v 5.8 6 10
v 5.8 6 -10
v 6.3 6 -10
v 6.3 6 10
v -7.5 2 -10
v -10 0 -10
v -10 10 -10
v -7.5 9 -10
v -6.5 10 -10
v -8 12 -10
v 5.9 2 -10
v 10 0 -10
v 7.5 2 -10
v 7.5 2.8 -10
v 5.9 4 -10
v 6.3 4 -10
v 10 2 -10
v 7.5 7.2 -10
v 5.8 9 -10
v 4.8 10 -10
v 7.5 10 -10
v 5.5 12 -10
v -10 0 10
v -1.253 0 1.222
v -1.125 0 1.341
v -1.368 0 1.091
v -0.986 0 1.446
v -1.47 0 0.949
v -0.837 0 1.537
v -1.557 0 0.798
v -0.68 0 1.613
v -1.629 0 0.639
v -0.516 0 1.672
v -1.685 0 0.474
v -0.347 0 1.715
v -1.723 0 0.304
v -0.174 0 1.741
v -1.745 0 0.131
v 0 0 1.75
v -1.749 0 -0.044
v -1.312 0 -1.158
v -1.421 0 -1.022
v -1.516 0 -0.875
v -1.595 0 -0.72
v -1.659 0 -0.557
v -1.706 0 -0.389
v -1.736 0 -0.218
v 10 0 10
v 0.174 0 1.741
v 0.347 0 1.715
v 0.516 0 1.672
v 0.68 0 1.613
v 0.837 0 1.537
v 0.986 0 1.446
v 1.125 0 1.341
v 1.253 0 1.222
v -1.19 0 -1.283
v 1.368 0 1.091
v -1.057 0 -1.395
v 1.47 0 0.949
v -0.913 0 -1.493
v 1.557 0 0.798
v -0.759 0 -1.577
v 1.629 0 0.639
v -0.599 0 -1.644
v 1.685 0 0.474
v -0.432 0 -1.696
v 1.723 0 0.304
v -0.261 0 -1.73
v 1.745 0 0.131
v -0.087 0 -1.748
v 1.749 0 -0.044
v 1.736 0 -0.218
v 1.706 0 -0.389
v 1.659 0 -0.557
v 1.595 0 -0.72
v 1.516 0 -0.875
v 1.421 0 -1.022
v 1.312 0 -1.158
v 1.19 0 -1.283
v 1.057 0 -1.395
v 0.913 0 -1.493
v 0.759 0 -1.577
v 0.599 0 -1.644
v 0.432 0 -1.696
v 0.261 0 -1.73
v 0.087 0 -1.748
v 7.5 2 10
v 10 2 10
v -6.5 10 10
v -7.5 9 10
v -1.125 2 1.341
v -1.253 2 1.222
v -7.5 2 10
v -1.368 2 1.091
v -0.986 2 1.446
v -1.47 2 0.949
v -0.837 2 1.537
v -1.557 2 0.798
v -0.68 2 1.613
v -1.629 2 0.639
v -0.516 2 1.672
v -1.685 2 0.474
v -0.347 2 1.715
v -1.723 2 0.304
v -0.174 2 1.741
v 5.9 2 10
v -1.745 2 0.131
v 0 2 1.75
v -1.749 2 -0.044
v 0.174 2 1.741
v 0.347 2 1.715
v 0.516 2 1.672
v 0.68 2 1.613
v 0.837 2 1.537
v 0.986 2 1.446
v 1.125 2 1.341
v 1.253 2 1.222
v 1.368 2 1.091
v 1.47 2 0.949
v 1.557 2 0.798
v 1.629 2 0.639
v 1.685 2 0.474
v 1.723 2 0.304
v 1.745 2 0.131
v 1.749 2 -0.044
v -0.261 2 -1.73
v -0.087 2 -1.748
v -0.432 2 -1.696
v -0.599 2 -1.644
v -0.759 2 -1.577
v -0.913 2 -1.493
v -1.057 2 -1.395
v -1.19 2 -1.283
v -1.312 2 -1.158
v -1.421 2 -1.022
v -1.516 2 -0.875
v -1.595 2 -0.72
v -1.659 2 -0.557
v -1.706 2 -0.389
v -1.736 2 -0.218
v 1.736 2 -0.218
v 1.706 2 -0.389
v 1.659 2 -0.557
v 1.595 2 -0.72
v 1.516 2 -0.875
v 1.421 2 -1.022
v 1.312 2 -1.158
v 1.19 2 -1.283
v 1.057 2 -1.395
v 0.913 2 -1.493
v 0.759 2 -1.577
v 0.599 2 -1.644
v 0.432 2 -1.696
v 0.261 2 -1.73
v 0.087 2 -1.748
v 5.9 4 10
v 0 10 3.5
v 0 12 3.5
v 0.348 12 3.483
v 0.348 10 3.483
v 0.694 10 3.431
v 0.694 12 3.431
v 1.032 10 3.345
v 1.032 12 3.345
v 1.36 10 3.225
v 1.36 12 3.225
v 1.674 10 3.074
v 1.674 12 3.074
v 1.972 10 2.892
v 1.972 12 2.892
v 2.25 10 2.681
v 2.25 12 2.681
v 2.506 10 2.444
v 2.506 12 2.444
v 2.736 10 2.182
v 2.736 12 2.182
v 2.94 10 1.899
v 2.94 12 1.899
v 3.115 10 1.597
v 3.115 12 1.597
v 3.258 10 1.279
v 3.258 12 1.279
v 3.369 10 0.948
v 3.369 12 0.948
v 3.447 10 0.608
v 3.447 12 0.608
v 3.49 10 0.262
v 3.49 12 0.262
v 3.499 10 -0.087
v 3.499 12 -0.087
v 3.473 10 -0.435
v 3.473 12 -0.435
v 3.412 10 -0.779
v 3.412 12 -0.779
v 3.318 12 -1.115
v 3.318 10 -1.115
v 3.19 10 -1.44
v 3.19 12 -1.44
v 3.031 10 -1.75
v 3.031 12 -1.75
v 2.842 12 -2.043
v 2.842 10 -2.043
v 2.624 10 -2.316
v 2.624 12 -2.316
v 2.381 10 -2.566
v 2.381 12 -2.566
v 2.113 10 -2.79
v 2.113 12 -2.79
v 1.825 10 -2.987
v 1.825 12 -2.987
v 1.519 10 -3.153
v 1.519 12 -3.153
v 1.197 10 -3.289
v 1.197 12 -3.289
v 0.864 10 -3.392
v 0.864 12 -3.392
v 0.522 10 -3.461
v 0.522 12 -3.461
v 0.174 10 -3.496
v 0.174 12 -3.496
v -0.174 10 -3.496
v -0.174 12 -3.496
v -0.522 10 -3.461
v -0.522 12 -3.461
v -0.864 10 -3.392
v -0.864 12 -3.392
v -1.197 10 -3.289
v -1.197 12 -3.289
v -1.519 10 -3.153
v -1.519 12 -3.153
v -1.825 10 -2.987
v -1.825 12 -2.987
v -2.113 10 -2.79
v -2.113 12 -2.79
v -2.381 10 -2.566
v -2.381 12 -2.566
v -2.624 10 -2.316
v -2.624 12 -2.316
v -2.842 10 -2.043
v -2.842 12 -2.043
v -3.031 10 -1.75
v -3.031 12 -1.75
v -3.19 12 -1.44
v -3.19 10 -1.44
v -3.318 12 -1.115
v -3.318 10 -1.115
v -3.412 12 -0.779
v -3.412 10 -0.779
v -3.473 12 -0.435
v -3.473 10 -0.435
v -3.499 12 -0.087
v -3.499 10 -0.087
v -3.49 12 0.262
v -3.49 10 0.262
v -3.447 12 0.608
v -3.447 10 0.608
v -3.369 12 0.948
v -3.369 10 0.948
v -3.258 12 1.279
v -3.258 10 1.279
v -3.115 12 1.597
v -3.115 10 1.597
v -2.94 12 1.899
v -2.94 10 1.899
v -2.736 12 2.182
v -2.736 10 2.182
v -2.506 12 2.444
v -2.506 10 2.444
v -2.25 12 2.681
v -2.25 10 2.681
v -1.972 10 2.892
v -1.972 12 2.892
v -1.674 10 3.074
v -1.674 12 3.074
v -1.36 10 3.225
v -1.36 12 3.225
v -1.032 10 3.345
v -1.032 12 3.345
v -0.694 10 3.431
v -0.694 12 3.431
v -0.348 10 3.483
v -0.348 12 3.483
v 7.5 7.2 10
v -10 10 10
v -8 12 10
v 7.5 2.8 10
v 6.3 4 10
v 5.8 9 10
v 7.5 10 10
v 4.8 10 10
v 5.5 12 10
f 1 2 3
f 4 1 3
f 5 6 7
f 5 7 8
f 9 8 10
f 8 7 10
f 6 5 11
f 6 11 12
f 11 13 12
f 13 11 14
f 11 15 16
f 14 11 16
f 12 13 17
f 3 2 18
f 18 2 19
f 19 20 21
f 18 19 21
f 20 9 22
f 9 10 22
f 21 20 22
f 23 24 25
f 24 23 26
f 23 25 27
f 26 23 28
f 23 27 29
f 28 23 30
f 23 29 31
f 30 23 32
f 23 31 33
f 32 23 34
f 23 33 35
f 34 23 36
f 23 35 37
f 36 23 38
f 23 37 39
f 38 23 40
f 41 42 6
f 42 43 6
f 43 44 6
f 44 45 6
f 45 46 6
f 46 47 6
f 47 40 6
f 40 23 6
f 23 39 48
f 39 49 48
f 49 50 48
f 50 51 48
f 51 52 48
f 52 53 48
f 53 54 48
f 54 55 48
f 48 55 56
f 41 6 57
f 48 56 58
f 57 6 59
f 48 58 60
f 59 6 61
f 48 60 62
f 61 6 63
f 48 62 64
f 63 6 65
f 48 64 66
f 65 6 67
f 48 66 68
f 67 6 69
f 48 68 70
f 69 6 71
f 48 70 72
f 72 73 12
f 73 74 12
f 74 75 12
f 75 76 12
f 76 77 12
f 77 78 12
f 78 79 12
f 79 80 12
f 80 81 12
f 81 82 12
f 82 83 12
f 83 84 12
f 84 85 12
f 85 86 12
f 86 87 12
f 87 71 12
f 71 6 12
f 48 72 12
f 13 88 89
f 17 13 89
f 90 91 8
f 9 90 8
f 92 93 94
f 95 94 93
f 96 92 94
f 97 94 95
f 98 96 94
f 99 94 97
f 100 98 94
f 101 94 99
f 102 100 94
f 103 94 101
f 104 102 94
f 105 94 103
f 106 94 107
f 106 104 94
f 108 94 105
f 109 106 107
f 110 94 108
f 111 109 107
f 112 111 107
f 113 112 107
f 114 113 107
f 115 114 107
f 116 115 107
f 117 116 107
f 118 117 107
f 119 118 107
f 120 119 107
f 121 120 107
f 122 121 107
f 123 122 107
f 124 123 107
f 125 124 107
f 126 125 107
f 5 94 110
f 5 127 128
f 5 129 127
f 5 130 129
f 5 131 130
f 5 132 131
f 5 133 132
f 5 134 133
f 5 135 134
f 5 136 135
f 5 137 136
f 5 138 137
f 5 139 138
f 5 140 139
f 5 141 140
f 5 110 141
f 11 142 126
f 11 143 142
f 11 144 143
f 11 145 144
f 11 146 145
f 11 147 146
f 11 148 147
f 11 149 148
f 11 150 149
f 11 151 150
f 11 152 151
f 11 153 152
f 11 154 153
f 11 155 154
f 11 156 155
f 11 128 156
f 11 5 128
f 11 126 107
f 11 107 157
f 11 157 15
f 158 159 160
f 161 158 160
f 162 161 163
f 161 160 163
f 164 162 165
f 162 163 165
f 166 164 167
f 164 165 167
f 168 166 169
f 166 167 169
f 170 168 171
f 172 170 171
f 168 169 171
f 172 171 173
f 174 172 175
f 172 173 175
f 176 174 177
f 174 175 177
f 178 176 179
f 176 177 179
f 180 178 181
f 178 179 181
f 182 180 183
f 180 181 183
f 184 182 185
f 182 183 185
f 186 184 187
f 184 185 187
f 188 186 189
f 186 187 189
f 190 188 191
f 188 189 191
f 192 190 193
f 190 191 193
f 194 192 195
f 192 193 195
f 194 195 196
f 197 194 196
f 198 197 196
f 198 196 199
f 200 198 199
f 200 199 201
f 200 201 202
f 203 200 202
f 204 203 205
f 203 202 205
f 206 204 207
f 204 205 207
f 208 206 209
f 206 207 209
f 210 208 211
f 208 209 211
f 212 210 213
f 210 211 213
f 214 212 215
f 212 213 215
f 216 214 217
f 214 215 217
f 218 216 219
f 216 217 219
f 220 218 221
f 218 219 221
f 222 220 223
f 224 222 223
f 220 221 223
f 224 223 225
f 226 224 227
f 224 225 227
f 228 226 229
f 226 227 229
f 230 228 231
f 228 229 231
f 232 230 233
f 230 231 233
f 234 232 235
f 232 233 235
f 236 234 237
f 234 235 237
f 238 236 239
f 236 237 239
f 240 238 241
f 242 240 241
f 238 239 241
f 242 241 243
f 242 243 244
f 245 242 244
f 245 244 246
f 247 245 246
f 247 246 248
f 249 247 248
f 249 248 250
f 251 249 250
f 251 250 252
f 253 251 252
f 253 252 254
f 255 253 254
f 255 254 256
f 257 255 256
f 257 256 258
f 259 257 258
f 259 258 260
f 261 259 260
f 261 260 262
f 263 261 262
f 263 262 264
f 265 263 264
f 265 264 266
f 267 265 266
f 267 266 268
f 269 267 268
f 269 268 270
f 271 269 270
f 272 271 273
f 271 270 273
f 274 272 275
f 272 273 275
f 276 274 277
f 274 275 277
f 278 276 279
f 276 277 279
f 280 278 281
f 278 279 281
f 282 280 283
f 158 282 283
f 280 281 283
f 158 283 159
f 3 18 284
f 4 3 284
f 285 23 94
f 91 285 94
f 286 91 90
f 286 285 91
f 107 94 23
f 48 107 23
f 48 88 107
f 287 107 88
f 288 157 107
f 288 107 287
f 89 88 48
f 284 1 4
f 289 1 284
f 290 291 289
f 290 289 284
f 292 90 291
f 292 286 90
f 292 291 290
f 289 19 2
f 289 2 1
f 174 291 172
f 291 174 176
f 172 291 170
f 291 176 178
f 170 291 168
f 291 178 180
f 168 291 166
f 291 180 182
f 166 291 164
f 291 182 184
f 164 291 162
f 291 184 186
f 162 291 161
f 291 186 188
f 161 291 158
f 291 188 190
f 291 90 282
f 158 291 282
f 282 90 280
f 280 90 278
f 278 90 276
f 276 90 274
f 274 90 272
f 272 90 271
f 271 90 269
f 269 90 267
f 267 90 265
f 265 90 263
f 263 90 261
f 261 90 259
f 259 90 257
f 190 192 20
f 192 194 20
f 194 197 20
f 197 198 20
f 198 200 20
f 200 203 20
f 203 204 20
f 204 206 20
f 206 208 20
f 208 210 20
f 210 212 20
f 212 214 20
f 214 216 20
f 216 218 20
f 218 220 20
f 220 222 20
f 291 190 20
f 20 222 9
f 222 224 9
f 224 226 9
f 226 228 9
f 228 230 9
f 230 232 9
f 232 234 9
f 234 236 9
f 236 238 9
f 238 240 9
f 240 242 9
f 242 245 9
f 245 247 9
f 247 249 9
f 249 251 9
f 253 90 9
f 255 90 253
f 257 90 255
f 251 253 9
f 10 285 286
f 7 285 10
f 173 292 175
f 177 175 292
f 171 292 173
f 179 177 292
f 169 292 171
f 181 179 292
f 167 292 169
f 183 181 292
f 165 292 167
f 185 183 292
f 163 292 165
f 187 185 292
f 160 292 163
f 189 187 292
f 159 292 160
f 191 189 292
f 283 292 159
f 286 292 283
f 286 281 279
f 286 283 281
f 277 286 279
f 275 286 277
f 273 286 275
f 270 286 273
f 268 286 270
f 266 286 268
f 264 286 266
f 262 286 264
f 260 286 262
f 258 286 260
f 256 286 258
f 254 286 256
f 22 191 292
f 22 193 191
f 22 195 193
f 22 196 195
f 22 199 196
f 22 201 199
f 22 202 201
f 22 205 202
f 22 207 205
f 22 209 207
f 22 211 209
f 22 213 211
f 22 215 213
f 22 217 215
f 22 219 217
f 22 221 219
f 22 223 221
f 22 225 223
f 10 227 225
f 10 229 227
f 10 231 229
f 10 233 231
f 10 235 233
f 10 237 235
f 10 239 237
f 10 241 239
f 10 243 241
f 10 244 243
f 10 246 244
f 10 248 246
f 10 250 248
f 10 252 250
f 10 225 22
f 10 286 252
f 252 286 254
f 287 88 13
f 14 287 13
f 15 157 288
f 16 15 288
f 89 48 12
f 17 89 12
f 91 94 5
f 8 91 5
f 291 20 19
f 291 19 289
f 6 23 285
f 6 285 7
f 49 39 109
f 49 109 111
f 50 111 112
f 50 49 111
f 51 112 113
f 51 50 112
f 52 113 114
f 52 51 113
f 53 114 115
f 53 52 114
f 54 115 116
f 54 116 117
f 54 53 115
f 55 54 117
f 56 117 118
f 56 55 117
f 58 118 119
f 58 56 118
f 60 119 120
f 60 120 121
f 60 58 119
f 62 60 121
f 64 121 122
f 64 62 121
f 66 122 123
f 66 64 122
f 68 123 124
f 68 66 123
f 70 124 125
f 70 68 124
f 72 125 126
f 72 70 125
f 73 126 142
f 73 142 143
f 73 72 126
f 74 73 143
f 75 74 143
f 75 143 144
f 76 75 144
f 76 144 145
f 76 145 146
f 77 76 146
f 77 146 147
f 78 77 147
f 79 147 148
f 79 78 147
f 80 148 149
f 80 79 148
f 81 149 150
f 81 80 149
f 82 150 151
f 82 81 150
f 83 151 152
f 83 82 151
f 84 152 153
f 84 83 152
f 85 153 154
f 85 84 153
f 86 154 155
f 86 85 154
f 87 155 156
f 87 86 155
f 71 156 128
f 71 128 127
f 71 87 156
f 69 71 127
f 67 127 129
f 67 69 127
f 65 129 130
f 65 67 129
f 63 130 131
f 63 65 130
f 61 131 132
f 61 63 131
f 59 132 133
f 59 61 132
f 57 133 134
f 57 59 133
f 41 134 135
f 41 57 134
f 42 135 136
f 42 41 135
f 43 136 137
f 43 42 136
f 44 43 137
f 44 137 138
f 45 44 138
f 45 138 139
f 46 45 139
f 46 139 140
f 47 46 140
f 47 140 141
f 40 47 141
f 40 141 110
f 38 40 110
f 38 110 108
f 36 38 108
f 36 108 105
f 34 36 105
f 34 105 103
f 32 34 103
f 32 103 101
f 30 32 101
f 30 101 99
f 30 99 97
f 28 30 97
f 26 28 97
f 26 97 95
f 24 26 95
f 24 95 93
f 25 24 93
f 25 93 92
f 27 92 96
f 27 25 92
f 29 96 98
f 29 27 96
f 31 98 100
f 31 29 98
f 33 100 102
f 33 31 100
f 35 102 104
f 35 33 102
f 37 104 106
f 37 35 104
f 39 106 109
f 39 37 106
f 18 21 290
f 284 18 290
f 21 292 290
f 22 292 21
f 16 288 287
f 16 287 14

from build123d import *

# Parameters (mm, degrees)
SKETCH1_W           = 20
SKETCH1_H           = 20
SKETCH1_R           = 1.75
BOSS_EXTRUDE1_DEPTH = 2
SKETCH2_W           = 2.5
SKETCH2_H           = 20
BOSS_EXTRUDE2_DEPTH = 10
SKETCH3_W           = 20
SKETCH3_H           = 2
BOSS_EXTRUDE3_DEPTH = 15
SKETCH4_W           = 1.7
SKETCH4_H           = 20
BOSS_EXTRUDE4_DEPTH = 4
CHAMFER1_SIZE       = 1.2
CHAMFER2_SIZE       = 2
CHAMFER3_SIZE       = 1
SKETCH5_R           = 1.75
CUT_EXTRUDE1_DEPTH  = 34
SKETCH6_R           = 3.5
CUT_EXTRUDE2_DEPTH  = 2
SKETCH7_W           = 1.6
SKETCH7_H           = 20
BOSS_EXTRUDE5_DEPTH = 2
CHAMFER4_SIZE       = 1.2


with BuildPart() as part:
    # Sketch1 → Boss-Extrude1 (new body)
    with BuildSketch(Plane(origin=(0, 0, 0), x_dir=(1, 0, 0), z_dir=(0, 1, 0))):
        Rectangle(SKETCH1_W, SKETCH1_H)
        with Locations(Location((0, 0, 0), (0, 0, 270))):
            Circle(SKETCH1_R, mode=Mode.SUBTRACT)
    extrude(amount=BOSS_EXTRUDE1_DEPTH)

    # Sketch2 → Boss-Extrude2 (add)
    with BuildSketch(Plane(origin=(0, 2, 0), x_dir=(1, 0, 0), z_dir=(0, 1, 0))):
        with Locations((-8.75, 0)):
            Rectangle(SKETCH2_W, SKETCH2_H)
    extrude(amount=BOSS_EXTRUDE2_DEPTH)

    # Sketch3 → Boss-Extrude3 (add)
    with BuildSketch(Plane(origin=(-7.5, 0, 0), x_dir=(0, 0, -1), z_dir=(1, 0, 0))):
        with Locations((0, 11)):
            Rectangle(SKETCH3_W, SKETCH3_H)
    extrude(amount=BOSS_EXTRUDE3_DEPTH)

    # Sketch4 → Boss-Extrude4 (add)
    with BuildSketch(Plane.XZ.offset(-10)):
        with Locations((6.65, 0)):
            Rectangle(SKETCH4_W, SKETCH4_H)
    extrude(amount=BOSS_EXTRUDE4_DEPTH)

    # Chamfer1
    chamfer1_edges = [part.edges().sort_by_distance(p)[0] for p in [
        (7.5, 6, 0),
    ]]
    chamfer(chamfer1_edges, length=CHAMFER1_SIZE)

    # Chamfer2
    chamfer2_edges = [part.edges().sort_by_distance(p)[0] for p in [
        (-10, 12, 0),
        (7.5, 12, 0),
    ]]
    chamfer(chamfer2_edges, length=CHAMFER2_SIZE)

    # Chamfer3
    chamfer3_edges = [part.edges().sort_by_distance(p)[0] for p in [
        (-7.5, 10, 0),
        (5.8, 10, 0),
    ]]
    chamfer(chamfer3_edges, length=CHAMFER3_SIZE)

    # Sketch5 → Cut-Extrude1 (cut)
    with BuildSketch(Plane.XZ):
        with Locations(Location((0, 0, 0), (0, 0, 90))):
            Circle(SKETCH5_R)
    extrude(amount=-CUT_EXTRUDE1_DEPTH, mode=Mode.SUBTRACT)

    # Sketch6 → Cut-Extrude2 (cut)
    with BuildSketch(Plane(origin=(0, 12, 0), x_dir=(1, 0, 0), z_dir=(0, 1, 0))):
        with Locations(Location((0, 0, 0), (0, 0, 270))):
            Circle(SKETCH6_R)
    extrude(amount=-CUT_EXTRUDE2_DEPTH, mode=Mode.SUBTRACT)

    # Sketch7 → Boss-Extrude5 (add)
    with BuildSketch(Plane(origin=(0, 2, 0), x_dir=(1, 0, 0), z_dir=(0, 1, 0))):
        with Locations((6.7, 0)):
            Rectangle(SKETCH7_W, SKETCH7_H)
    extrude(amount=BOSS_EXTRUDE5_DEPTH)

    # Chamfer4
    chamfer4_edges = [part.edges().sort_by_distance(p)[0] for p in [
        (7.5, 4, 0),
    ]]
    chamfer(chamfer4_edges, length=CHAMFER4_SIZE)


solid = part.part
